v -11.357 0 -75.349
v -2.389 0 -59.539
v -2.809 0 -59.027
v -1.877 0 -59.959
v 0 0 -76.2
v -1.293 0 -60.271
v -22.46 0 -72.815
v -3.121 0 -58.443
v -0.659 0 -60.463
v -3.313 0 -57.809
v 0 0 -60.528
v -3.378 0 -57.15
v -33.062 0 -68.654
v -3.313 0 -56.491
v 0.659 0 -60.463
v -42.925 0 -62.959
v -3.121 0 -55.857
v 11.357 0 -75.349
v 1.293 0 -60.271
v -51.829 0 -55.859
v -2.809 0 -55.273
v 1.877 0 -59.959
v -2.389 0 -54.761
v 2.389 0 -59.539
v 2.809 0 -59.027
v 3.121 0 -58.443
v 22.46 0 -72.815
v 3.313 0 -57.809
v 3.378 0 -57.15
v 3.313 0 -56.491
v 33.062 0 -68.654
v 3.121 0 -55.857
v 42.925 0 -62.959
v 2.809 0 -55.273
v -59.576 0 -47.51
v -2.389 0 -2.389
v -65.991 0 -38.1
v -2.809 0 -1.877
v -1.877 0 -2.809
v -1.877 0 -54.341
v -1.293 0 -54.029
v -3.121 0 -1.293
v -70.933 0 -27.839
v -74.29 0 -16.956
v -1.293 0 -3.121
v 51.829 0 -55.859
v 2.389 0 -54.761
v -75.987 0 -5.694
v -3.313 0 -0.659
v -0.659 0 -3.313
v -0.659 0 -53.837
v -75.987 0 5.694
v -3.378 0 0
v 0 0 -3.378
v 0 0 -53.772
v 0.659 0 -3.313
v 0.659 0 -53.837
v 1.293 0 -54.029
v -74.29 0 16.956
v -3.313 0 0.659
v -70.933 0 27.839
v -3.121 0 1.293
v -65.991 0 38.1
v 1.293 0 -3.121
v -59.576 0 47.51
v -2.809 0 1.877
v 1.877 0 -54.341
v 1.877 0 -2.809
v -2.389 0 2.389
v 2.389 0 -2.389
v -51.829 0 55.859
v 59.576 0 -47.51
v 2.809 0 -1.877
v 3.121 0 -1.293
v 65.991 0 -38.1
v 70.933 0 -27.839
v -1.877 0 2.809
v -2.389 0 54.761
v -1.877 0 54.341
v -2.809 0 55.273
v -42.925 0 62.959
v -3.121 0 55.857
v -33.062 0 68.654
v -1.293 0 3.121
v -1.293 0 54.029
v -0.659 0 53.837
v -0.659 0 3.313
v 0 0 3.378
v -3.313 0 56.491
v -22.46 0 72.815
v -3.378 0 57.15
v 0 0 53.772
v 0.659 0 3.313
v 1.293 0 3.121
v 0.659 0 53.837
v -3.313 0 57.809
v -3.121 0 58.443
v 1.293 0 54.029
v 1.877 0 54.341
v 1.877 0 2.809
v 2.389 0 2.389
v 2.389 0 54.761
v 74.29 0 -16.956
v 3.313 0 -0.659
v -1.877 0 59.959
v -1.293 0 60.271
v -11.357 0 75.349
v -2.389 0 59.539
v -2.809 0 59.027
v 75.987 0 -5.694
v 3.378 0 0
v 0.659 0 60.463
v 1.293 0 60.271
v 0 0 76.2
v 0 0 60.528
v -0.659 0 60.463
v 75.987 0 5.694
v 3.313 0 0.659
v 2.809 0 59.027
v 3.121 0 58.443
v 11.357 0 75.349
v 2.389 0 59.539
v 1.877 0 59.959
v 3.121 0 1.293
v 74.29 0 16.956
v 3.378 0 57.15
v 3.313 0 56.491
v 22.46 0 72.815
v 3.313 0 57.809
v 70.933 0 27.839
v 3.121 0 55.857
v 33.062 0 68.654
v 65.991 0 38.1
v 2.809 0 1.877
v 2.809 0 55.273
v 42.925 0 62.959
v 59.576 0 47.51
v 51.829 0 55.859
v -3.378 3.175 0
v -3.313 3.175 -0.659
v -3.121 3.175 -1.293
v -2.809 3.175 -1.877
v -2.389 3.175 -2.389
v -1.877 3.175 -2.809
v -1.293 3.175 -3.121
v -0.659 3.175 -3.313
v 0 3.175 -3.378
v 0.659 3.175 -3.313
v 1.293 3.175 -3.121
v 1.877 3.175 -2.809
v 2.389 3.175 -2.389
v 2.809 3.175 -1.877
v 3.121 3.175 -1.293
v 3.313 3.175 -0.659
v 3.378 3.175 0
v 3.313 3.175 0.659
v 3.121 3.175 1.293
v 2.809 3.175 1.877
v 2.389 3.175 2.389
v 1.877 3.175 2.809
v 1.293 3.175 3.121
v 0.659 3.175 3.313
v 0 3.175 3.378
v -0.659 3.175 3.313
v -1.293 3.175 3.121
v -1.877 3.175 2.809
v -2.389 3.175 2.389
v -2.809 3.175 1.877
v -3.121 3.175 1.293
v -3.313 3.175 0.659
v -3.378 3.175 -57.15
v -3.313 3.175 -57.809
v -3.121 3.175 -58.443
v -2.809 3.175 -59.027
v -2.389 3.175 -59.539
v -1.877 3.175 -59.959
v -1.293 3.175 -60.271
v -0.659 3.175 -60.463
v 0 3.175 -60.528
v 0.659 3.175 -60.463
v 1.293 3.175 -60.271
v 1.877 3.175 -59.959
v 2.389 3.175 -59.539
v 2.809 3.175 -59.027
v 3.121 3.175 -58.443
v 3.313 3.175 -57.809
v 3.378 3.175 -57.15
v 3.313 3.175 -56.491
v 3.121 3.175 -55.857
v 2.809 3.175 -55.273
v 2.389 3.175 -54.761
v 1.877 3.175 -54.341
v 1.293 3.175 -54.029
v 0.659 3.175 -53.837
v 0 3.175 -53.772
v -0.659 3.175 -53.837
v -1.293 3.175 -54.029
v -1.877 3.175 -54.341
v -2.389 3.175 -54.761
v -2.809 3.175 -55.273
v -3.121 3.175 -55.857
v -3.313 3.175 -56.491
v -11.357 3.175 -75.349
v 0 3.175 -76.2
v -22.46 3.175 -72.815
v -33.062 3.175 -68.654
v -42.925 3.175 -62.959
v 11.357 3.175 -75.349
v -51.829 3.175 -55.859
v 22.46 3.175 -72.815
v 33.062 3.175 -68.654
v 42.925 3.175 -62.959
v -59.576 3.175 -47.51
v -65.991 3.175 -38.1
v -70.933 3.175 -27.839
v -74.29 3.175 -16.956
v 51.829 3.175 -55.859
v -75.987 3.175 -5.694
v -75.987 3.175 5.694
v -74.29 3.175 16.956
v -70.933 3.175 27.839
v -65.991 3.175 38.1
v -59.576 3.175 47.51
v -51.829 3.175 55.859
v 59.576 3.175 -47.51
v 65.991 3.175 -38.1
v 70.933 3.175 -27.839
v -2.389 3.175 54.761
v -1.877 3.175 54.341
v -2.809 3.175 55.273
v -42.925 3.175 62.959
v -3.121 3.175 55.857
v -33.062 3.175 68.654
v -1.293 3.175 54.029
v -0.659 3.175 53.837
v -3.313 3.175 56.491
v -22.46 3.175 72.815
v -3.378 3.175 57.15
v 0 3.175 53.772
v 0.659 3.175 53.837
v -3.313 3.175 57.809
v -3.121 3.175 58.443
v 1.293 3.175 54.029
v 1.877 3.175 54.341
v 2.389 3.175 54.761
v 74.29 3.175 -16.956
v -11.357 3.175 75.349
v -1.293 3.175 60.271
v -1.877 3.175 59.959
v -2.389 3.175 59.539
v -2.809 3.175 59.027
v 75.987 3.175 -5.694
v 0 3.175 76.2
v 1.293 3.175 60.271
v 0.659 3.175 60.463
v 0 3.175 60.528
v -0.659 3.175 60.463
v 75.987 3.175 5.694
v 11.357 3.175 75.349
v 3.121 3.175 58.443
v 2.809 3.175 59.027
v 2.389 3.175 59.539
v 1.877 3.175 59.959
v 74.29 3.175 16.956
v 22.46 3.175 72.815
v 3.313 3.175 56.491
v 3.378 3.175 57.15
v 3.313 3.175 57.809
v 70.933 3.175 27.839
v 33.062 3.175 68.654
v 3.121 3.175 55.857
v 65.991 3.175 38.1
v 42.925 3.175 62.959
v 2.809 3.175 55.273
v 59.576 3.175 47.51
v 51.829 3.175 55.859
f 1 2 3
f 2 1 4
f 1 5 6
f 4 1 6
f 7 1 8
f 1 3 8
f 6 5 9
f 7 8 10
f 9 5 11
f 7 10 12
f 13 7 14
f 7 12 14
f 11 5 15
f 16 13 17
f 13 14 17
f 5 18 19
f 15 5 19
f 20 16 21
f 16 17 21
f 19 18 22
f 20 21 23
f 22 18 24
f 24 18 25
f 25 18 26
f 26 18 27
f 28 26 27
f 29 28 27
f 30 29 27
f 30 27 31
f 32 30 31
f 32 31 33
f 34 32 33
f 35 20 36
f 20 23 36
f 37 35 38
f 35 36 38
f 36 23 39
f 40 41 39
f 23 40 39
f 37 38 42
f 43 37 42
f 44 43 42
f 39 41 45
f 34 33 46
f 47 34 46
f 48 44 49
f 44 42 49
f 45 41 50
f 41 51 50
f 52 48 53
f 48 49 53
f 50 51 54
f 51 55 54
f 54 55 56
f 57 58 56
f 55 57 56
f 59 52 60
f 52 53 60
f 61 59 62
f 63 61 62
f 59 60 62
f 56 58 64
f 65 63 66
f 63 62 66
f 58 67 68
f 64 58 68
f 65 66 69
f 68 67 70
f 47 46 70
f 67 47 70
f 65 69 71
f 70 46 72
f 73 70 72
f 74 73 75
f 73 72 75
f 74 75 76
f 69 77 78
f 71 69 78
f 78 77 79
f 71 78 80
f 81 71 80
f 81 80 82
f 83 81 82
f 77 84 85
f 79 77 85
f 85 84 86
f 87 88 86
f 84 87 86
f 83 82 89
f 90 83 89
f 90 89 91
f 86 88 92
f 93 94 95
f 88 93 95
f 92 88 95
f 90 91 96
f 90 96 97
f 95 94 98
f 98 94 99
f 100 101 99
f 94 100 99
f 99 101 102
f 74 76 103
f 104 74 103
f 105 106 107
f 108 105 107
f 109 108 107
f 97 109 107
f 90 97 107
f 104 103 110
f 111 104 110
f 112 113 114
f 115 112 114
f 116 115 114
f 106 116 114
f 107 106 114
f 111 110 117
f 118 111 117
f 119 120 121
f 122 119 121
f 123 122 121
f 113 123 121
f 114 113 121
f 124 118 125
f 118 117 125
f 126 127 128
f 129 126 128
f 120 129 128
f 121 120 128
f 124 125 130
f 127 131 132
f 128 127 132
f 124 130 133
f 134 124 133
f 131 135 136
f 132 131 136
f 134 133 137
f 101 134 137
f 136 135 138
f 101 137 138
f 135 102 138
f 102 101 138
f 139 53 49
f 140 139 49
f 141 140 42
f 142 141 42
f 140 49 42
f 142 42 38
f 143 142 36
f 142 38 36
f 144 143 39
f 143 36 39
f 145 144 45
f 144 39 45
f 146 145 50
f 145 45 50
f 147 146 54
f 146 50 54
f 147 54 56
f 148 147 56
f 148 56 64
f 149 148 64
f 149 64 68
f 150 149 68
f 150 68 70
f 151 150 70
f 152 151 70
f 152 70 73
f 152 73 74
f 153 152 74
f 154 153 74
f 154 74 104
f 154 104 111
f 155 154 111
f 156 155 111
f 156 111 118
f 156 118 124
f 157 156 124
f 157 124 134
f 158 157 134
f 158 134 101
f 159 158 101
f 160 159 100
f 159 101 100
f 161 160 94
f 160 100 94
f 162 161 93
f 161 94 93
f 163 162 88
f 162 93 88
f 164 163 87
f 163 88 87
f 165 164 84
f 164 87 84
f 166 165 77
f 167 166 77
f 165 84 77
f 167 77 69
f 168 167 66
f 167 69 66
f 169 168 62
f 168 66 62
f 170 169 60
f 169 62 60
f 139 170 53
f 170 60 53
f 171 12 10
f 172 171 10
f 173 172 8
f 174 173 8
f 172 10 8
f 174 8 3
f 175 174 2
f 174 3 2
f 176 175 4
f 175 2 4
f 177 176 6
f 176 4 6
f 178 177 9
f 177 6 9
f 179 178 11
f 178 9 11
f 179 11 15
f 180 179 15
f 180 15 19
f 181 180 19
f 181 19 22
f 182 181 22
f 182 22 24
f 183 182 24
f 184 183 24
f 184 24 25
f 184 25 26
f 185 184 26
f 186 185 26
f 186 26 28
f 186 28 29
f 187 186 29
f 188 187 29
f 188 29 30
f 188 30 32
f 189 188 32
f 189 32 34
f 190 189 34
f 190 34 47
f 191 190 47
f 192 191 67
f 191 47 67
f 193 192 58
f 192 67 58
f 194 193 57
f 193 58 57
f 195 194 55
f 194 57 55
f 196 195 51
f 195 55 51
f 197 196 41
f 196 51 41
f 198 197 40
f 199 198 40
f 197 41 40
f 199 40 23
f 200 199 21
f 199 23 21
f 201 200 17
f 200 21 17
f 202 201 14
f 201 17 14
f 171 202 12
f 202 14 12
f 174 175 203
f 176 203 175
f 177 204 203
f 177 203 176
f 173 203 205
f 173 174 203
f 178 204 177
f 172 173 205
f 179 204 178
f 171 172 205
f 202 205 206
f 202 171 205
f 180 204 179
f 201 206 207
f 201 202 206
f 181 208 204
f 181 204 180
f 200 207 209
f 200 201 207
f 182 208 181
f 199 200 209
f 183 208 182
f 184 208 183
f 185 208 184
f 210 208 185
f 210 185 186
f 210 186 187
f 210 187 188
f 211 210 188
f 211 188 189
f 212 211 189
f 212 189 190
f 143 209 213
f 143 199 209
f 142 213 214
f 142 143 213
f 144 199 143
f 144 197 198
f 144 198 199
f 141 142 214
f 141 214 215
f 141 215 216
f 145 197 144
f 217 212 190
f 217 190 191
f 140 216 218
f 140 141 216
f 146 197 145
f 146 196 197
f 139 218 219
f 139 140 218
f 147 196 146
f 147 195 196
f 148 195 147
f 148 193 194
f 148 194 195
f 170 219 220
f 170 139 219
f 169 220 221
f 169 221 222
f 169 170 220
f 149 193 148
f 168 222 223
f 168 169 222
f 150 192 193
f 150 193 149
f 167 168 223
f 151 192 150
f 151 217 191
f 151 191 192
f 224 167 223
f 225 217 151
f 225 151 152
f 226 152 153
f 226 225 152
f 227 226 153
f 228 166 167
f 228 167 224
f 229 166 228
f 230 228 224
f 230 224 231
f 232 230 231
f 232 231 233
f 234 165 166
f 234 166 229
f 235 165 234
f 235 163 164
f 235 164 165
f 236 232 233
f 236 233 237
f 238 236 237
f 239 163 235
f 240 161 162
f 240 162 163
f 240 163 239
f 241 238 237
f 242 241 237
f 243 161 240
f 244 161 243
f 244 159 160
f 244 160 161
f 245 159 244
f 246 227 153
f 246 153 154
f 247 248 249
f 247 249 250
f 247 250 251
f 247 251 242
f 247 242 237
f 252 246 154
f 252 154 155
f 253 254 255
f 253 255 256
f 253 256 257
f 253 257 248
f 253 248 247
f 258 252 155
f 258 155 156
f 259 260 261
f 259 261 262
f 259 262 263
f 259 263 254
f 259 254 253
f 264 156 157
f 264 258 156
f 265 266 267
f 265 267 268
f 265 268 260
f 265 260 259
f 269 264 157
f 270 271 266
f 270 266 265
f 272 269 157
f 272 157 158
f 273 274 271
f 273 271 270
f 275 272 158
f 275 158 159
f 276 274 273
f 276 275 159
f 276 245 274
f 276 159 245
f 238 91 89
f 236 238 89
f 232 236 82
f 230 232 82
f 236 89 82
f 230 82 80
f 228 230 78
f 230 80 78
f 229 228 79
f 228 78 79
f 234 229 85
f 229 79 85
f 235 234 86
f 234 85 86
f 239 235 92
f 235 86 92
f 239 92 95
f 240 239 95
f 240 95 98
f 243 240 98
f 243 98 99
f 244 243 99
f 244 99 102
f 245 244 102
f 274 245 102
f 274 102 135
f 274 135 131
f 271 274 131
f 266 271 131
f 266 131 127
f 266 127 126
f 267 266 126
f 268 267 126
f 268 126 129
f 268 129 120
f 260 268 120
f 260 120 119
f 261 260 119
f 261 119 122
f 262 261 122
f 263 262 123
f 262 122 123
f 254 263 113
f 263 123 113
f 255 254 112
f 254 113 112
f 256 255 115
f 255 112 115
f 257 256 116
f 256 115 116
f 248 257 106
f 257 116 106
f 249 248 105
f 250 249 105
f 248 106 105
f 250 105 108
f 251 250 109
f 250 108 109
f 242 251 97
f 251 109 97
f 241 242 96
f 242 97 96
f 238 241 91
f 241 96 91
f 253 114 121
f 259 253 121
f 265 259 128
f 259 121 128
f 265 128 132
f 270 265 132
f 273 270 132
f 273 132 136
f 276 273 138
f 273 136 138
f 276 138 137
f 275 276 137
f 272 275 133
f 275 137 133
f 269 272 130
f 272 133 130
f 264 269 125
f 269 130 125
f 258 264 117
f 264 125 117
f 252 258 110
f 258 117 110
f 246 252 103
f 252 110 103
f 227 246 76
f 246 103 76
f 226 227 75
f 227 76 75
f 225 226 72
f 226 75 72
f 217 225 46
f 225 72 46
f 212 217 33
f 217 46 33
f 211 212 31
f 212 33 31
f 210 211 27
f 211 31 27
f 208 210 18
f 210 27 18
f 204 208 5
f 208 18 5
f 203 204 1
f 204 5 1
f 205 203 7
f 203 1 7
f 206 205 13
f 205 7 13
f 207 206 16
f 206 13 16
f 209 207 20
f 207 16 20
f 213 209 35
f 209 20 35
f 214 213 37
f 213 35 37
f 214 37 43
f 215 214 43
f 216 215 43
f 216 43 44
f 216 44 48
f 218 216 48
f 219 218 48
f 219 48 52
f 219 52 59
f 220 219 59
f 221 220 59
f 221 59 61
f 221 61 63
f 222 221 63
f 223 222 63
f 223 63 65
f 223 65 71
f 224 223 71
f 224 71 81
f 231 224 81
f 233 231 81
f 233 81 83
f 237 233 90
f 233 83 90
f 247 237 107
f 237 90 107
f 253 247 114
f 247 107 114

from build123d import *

# Parameters (mm, degrees)
SKETCH2_R               = 76.2
BOSS_EXTRUDE1_DEPTH     = 3.175
F_1_4_CLEARANCE_HOLE1_D = 6.7564
F_1_4_CLEARANCE_HOLE2_D = 6.7564


with BuildPart() as part:
    # Sketch2 → Boss-Extrude1 (new body)
    with BuildSketch(Plane(origin=(0, 0, 0), x_dir=(1, 0, 0), z_dir=(0, 1, 0))):
        with Locations(Location((0, 0, 0), (0, 0, 270))):
            Circle(SKETCH2_R)
    extrude(amount=BOSS_EXTRUDE1_DEPTH)

    # 1/4 Clearance Hole1 (through all)
    with Locations(Plane(origin=(0, 3.175, 0), x_dir=(1, 0, 0), z_dir=(0, 1, 0))):
        with Locations((0, 57.15), (0, -57.15)):
            Hole(F_1_4_CLEARANCE_HOLE1_D / 2)

    # 1/4 Clearance Hole2 (through all)
    with Locations(Plane(origin=(0, 3.175, 0), x_dir=(1, 0, 0), z_dir=(0, 1, 0))):
        with Locations((0, 0)):
            Hole(F_1_4_CLEARANCE_HOLE2_D / 2)


solid = part.part
